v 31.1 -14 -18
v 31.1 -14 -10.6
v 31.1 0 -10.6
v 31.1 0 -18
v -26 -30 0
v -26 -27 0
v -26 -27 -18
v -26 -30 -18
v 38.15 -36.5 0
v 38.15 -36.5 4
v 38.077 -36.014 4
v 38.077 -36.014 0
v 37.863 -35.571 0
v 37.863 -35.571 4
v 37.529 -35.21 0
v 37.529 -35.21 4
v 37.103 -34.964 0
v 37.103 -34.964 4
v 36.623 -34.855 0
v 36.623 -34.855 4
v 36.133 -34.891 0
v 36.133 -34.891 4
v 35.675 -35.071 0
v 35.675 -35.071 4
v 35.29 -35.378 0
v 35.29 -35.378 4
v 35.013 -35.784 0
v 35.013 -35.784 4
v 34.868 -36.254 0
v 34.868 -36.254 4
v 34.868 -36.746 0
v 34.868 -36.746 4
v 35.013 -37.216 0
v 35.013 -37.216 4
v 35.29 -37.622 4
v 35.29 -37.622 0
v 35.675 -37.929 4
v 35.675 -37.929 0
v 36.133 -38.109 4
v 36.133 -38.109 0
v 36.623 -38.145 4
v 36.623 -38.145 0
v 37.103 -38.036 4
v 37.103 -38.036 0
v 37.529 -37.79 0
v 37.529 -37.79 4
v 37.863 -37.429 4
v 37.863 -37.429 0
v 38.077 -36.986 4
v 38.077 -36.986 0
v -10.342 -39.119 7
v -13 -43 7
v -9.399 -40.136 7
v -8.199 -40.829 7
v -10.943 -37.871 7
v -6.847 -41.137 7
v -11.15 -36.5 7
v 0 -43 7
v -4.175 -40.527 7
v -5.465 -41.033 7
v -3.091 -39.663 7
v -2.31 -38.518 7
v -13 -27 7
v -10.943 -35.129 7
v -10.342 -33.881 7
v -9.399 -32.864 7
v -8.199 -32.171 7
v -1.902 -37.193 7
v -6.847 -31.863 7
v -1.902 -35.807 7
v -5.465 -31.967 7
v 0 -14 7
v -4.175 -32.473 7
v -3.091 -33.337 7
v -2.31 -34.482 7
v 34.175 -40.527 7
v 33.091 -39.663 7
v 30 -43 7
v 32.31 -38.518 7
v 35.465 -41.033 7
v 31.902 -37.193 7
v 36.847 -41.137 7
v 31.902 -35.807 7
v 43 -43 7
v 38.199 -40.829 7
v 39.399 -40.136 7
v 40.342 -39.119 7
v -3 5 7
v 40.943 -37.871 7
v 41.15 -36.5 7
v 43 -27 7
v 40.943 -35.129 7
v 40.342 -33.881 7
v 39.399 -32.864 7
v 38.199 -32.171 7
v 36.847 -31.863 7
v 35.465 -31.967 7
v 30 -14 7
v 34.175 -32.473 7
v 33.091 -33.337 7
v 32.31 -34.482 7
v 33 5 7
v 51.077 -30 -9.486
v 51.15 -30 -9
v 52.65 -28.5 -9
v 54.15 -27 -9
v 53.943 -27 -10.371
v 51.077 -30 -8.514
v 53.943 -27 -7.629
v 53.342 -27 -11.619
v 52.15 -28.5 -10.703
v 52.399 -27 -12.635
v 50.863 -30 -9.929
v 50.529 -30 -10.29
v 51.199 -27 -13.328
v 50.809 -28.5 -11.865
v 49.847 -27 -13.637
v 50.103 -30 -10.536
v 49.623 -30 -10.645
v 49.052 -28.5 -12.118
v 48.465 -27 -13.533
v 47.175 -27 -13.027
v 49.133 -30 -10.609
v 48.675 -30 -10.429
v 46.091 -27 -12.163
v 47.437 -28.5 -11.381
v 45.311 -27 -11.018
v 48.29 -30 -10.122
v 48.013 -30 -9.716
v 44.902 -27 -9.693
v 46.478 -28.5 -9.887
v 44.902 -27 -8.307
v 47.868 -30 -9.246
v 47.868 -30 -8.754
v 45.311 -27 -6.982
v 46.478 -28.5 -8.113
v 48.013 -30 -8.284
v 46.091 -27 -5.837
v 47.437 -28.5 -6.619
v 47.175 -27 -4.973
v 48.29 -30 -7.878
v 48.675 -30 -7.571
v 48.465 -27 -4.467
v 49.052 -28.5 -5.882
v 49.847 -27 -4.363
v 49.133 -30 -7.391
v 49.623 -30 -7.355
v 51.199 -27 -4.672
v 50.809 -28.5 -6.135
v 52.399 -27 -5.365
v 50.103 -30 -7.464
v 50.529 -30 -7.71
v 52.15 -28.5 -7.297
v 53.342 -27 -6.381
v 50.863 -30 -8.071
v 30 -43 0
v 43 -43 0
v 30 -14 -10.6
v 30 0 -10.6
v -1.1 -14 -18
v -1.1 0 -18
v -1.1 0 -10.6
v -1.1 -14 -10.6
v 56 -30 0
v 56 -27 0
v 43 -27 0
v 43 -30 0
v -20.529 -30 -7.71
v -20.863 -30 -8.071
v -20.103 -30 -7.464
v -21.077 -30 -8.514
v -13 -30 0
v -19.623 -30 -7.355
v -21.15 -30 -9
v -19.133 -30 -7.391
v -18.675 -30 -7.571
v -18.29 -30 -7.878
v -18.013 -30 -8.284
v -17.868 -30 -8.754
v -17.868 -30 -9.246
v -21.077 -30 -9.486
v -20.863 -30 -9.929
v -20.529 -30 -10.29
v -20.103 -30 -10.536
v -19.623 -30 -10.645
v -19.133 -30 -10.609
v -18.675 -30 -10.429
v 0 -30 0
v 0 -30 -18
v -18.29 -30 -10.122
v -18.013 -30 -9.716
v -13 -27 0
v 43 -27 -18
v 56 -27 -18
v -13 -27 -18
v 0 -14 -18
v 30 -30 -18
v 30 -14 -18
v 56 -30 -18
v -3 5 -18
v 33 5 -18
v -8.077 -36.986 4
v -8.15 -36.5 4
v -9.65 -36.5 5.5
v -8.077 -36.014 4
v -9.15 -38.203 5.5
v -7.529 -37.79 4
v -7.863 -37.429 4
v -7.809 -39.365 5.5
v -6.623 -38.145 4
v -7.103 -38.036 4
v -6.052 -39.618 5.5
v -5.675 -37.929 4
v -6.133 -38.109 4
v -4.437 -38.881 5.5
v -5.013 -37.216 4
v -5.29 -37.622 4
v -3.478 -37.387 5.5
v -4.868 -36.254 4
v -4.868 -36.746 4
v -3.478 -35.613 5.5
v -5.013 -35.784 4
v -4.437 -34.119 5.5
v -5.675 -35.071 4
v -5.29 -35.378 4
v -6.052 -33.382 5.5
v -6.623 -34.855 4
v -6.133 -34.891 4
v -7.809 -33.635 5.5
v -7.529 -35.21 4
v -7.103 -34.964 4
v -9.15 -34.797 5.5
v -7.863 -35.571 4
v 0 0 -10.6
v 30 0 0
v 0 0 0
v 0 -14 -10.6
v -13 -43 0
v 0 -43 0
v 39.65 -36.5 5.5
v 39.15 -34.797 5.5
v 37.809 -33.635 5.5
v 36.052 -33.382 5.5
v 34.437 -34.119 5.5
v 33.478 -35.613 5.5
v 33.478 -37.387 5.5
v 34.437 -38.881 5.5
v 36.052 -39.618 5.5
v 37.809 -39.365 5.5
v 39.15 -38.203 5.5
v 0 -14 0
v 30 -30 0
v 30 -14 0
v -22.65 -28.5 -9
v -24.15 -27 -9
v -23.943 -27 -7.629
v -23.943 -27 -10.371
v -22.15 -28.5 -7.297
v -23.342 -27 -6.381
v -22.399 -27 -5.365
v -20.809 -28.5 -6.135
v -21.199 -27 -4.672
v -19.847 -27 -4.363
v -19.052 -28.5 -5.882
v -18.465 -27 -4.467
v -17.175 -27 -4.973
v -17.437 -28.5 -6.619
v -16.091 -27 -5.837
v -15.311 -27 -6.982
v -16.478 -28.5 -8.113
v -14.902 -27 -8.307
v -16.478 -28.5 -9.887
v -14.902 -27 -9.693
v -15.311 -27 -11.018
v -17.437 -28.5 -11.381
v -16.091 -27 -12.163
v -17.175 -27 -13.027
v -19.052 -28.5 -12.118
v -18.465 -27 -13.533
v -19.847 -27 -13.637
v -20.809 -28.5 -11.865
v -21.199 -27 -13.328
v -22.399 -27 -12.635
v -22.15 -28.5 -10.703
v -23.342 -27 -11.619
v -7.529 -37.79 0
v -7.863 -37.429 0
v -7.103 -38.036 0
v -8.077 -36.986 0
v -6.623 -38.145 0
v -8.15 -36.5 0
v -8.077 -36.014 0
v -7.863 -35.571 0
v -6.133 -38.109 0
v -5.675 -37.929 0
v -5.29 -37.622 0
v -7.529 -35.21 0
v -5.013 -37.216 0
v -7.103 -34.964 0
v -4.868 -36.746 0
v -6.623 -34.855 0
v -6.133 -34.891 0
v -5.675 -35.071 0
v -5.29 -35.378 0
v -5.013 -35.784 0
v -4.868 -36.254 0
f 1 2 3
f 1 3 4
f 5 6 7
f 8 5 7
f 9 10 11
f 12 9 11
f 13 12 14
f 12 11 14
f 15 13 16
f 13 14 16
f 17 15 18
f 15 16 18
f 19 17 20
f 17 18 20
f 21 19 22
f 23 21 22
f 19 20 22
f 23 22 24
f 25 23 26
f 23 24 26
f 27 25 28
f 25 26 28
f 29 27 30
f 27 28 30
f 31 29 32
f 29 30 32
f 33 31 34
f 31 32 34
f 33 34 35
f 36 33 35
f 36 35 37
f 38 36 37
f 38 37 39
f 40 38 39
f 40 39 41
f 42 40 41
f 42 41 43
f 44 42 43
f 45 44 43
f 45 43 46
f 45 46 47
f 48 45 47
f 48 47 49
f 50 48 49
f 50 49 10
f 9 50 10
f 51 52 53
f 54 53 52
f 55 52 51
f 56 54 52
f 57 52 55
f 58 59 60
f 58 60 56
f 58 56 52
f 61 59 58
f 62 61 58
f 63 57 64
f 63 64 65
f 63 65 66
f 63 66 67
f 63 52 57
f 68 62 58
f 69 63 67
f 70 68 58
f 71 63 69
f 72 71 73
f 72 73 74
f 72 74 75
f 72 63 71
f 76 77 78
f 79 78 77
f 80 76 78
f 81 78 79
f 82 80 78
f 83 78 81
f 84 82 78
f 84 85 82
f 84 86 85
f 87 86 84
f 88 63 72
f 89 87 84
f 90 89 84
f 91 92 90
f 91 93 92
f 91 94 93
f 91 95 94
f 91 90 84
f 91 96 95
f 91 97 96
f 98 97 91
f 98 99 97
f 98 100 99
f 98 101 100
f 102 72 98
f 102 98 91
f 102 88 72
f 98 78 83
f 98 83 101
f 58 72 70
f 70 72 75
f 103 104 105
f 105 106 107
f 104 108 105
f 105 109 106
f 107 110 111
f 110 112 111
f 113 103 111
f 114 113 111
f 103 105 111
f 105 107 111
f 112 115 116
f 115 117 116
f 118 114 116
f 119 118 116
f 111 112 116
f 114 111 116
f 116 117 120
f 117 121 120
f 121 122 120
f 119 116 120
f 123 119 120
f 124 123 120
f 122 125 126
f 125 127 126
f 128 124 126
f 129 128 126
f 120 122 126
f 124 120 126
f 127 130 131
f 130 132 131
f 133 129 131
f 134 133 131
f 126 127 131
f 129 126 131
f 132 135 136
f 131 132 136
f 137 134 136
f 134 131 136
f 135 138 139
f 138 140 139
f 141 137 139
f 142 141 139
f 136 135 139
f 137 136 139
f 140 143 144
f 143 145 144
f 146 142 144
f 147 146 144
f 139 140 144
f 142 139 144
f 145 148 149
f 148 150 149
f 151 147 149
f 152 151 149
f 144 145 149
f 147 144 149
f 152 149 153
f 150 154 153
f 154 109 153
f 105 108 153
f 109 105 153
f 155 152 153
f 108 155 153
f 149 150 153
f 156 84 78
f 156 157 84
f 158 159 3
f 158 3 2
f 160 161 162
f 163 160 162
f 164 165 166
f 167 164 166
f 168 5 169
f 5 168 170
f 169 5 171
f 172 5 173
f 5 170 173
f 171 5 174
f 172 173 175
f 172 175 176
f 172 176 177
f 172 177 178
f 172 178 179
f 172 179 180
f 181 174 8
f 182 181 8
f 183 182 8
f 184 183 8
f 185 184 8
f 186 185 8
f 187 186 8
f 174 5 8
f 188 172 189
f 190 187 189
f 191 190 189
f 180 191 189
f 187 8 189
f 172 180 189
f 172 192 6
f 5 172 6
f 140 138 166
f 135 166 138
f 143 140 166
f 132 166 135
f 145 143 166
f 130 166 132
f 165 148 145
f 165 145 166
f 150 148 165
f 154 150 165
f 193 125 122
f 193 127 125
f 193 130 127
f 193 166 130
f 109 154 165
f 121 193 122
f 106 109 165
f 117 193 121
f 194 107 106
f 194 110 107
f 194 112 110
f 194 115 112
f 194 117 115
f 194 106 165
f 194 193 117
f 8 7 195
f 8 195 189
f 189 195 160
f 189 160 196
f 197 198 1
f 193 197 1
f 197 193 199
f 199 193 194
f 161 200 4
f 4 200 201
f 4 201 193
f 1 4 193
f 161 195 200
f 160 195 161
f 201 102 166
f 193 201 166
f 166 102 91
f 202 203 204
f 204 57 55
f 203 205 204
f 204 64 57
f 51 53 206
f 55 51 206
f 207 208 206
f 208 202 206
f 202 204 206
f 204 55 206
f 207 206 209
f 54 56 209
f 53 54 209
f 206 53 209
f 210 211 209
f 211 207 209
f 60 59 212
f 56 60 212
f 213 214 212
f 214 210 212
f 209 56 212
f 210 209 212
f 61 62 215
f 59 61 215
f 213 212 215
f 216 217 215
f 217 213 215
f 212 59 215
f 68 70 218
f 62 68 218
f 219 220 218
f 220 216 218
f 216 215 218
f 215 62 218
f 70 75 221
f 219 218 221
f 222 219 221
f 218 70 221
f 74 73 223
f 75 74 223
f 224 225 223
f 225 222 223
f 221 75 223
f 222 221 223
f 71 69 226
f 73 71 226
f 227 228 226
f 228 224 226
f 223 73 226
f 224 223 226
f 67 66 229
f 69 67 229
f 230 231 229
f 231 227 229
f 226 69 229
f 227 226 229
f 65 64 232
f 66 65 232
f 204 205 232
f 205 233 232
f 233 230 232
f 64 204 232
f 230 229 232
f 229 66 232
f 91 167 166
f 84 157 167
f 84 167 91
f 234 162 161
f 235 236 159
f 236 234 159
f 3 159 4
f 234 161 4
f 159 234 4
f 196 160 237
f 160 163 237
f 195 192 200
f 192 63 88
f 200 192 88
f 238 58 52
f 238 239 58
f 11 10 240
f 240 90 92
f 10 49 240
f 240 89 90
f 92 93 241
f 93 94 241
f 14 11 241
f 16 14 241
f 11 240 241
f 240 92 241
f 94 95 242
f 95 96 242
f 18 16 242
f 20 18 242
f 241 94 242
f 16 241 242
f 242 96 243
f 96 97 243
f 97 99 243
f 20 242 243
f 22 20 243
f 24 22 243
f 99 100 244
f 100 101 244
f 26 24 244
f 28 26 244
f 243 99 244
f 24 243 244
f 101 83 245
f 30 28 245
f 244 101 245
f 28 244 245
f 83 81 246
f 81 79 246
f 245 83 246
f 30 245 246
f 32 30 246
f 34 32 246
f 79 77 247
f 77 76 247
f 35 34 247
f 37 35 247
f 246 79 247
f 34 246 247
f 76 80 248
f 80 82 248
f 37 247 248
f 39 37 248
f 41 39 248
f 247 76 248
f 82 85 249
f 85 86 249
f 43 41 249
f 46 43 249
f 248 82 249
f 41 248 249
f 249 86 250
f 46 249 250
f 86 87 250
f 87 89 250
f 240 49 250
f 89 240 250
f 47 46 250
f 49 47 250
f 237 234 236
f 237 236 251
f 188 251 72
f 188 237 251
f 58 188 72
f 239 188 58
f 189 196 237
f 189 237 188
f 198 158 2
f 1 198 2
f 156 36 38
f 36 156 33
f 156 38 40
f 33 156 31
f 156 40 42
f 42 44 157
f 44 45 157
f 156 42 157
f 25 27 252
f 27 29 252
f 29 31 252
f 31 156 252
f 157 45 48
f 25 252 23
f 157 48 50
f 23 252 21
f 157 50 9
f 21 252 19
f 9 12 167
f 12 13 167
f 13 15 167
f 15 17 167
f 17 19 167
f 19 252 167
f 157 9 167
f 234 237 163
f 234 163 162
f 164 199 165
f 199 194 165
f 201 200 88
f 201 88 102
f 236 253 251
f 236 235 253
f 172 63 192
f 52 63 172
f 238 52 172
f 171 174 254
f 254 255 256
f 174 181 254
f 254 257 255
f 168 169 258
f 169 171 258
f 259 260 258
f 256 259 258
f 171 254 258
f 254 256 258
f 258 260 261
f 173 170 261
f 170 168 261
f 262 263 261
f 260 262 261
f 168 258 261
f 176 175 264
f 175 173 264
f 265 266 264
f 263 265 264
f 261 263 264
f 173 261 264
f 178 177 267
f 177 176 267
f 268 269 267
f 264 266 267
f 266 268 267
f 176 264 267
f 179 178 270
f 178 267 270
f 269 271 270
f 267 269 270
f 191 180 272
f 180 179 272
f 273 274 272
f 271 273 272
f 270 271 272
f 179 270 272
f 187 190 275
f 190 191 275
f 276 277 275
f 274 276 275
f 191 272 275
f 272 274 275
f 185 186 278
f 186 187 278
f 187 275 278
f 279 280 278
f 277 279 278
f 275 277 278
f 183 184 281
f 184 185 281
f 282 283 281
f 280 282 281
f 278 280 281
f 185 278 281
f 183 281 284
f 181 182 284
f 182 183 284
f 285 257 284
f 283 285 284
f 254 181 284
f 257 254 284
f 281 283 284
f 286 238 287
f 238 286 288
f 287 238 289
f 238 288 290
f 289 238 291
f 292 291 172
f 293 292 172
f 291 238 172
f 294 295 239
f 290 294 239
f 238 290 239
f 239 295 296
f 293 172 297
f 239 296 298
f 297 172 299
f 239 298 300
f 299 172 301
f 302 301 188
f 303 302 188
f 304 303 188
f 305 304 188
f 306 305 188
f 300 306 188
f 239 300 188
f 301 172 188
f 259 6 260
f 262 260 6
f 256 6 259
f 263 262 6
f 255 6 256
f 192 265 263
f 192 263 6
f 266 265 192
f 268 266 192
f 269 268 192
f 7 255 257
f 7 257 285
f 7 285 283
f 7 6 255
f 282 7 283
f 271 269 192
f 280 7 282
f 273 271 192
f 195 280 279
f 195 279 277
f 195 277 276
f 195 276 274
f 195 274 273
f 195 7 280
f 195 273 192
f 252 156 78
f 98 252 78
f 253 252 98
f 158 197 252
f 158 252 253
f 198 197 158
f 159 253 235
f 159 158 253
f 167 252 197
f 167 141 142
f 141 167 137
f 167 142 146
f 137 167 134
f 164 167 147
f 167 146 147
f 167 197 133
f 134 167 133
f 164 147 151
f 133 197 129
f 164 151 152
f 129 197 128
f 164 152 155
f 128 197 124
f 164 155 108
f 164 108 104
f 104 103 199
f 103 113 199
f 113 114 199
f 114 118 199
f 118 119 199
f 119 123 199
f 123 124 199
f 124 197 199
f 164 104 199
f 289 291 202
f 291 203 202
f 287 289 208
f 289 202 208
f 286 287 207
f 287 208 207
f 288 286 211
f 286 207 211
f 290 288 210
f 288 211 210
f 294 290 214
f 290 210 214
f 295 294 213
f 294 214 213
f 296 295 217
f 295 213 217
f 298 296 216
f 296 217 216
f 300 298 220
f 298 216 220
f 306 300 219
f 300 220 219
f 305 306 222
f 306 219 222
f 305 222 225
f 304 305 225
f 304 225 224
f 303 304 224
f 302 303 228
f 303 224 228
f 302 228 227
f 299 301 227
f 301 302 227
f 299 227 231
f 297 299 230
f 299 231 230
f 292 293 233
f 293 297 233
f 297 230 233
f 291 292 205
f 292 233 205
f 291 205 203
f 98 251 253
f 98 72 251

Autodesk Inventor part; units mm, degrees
ref_plane "YZ Plane" through (0, 0, 0) normal (1, 0, 0) x (0, 1, 0)
ref_plane "XZ Plane" through (0, 0, 0) normal (0, 1, 0) x (-1, 0, 0)
ref_plane "XY Plane" through (0, 0, 0) normal (0, 0, 1) x (1, 0, 0)
sketch "Sketch1" plane through (0, 0, 0) normal (0, 1, 0) x (-1, 0, 0)
  line L0 (0, 0) -> (-30, 0)
  line L1 (-30, 0) -> (-30, -10.6)
  line L2 (-30, -10.6) -> (0, -10.6)
  line L3 (0, -10.6) -> (0, 0)
  line L4 (0, -10.6) -> (1.1, -10.6)
  line L5 (1.1, -10.6) -> (1.1, -18)
  line L6 (1.1, -18) -> (0, -18)
  line L7 (0, -18) -> (0, -10.6)
  line L8 (-30, -10.6) -> (-31.1, -10.6)
  line L9 (-31.1, -10.6) -> (-31.1, -18)
  line L10 (-31.1, -18) -> (-30, -18)
  line L11 (-30, -18) -> (-30, -10.6)
  line L12 (0, -18) -> (-30, -18)
  dimension "d0" = 30
  dimension "d1" = 10.6
  dimension "d2" = 1.1
  dimension "d3" = 1.1
  dimension "d4" = 7.4
  dimension "d5" = 7.4
extrude "Extrusion1" add sketch "Sketch1" along normal blind 3
sketch "Sketch2" plane through (30, 0, 0) normal (1, 0, 0) x (0, 0, -1)
  point P0 (0, 0)
sketch "Sketch3" plane through (30, 0, 0) normal (1, 0, 0) x (0, 0, -1)
  line L0 (0, 0) -> (10.6, 0) projected
  line L1 (0, 0) -> (0, -30)
  line L2 (0, -30) -> (10.6, -30)
  line L3 (10.6, 0) -> (10.6, -30)
  line L4 (10.6, 0) -> (0, 0) projected
  line L5 (0, 0) -> (10.6, 0)
  dimension "d8" = 30
sketch "Sketch4" plane through (31.1, 0, -10.6) normal (1, 0, 0) x (0, 0, -1)
  line L0 (0, 0) -> (7.4, 0) projected
  line L1 (7.4, 0) -> (7.4, -14)
  line L2 (7.4, -14) -> (0, -14)
  line L3 (0, -14) -> (0, 0)
  line L4 (0, 0) -> (7.4, 0)
  point P0 (-10.6, 0)
  dimension "d9" = 14
extrude "Extrusion2" add sketch "Sketch3" along normal blind 3
extrude "Extrusion3" add sketch "Sketch4" along normal blind 3
sketch "Sketch5" plane through (31.1, -14, -18) normal (0, -1, 0) x (1, 0, 0)
  line L0 (1.9, 7.4) -> (1.9, 18) projected
  line L1 (1.9, 7.4) -> (1.9, 0)
  line L2 (0, 0) -> (3, 0) projected
  line L3 (-1.1, 18) -> (-1.1, 7.4) projected
  line L4 (-1.1, 7.4) -> (-1.1, 0)
  line L5 (0, 0) -> (-32.2, 0) projected
  line L6 (-1.1, 7.4) -> (1.9, 7.4) projected
  line L7 (1.9, 7.4) -> (-1.1, 7.4)
  point P0 (-31.1, 18)
extrude "Extrusion4" add sketch "Sketch5" along normal blind 16
sketch "Sketch6" plane through (30, 0, 0) normal (0, 1, 0) x (1, 0, 0)
  line L0 (1.1, 10.6) -> (1.1, 18) projected
  line L1 (1.1, 10.6) -> (1.1, 0)
  line L2 (0, 0) -> (3, 0) projected
  line L3 (1.1, 0) -> (0, 0)
  line L4 (0, 0) -> (0, 10.6)
  line L5 (0, 0) -> (0, 18) projected
  line L6 (0, 10.6) -> (1.1, 10.6) projected
  line L7 (1.1, 10.6) -> (0, 10.6)
  point P0 (-30, 0)
extrude "Extrusion5" add sketch "Sketch6" along normal blind 3
sketch "Sketch7" plane through (31.1, 3, 0) normal (1, 0, 0) x (0, 0, -1)
  point P0 (0, -3)
sketch "Sketch8" plane through (31.1, 0, 0) normal (0, 1, 0) x (1, 0, 0)
  line L0 (0, 0) -> (1.9, 0) projected
  line L1 (0, 0) -> (0, 18) projected
  line L2 (1.9, 0) -> (0, 0)
  line L3 (0, 0) -> (0, 18)
  line L4 (0, 18) -> (1.9, 18)
  line L5 (1.9, 18) -> (1.9, 0)
  point P0 (-31.1, 0)
extrude "Extrusion6" add sketch "Sketch8" along normal up to surface (3 mm away)
sketch "Sketch9" plane through (33, -14, -10.6) normal (0, 0, 1) x (1, 0, 0)
  line L0 (0, 0) -> (0, 14) projected
  line L1 (0, 0) -> (1.1, 0) projected
  line L2 (1.1, 14) -> (1.1, 0) projected
  line L3 (0, 14) -> (1.1, 14) projected
  line L4 (0, 0) -> (0, 14) projected
  line L5 (0, 14) -> (1.1, 14)
  line L6 (1.1, 14) -> (1.1, 0)
  line L7 (1.1, 0) -> (0, 0)
  line L8 (0, 0) -> (0, 14)
  point P0 (-33, 14)
extrude "Extrusion7" cut sketch "Sketch9" against normal blind 2000
sketch "Sketch10" plane through (33, 0, 0) normal (1, 0, 0) x (0, 0, -1)
  line L0 (0, -30) -> (0, 3) projected
  line L1 (0, -30) -> (18, -30)
  line L2 (18, -30) -> (18, -27)
  line L3 (18, -27) -> (0, -27)
  line L4 (0, -27) -> (0, -30)
  point P0 (0, 0)
  point P1 (0, 1.1)
  dimension "d25" = 18
  dimension "d26" = 3
extrude "Extrusion8" add sketch "Sketch10" along normal blind 14
sketch "Sketch12" plane through (0, 3, 0) normal (0, 1, 0) x (1, 0, 0)
  line L0 (0, 10.6) -> (0, 0) projected
  line L1 (15, 0) -> (15, 18)
  point P0 (30, 10.6)
  point P1 (31.1, 10.6)
  point P2 (30, 0)
ref_plane "Work Plane1" through (15, 0, -10.6) normal (-1, 0, 0) x (0, 0, 1)
mirror "Mirror1" about plane through (15, 0, -10.6) normal (-1, 0, 0) of "Extrusion2", "Extrusion3", "Extrusion4", "Extrusion5", "Extrusion6", "Extrusion7", "Extrusion8"
sketch "Sketch13" plane through (30, -30, 0) normal (0, 0, 1) x (1, 0, 0)
  line L0 (-33, 33) -> (3, 33) projected
  line L1 (-30, 30) -> (0, 30)
  line L2 (0, 30) -> (0, 33)
  line L3 (0, 33) -> (-30, 33)
  line L4 (-30, 33) -> (-30, 30)
  point P0 (-31.1, 33)
  point P1 (1.1, 33)
  dimension "d36" = 30
extrude "Extrusion10" add sketch "Sketch13" along normal blind 7
sketch "Sketch14" plane through (0, 0, 0) normal (0, -1, 0) x (1, 0, 0)
  line L0 (0, 0) -> (0, 7) projected
  line L1 (30, 0) -> (30, -10.6) projected
  line L2 (0, 7) -> (30, 7)
  line L3 (30, 7) -> (30, 0)
  line L4 (30, 0) -> (0, 0)
  line L5 (0, 0) -> (0, 7)
extrude "Extrusion11" add sketch "Sketch14" along normal blind 14
sketch "Sketch16" plane through (0, 3, 0) normal (0, 1, 0) x (1, 0, 0)
  line L0 (30, -7) -> (0, -7) projected
  line L1 (-3, 18) -> (33, 18) projected
  line L2 (30, -7) -> (0, -7)
  line L3 (0, -7) -> (0, 18)
  line L4 (0, 18) -> (30, 18)
  line L5 (30, 18) -> (30, -7)
  line L6 (33, 18) -> (31.1, 18) projected
  line L7 (31.1, 18) -> (30, 18)
  line L8 (30, 18) -> (30, 0)
  line L9 (30, 0) -> (31.1, 0)
  line L10 (0, 0) -> (0, 18) projected
  line L11 (0, 18) -> (-1.1, 18)
  line L12 (-1.1, 0) -> (0, 0)
  line L13 (0, 0) -> (0, 18)
  line L14 (31.1, 18) -> (33, 18)
  line L15 (33, 0) -> (31.1, 0)
  line L16 (33, 0) -> (30, 0) projected
  line L17 (31.1, 18) -> (-1.1, 18) projected
  line L18 (-3, 18) -> (-17, 18) projected
  line L19 (-1.1, 18) -> (-3, 18)
  line L20 (-3, 18) -> (-3, 0) projected
  line L21 (-3, 18) -> (-3, 0)
  line L22 (-3, 0) -> (-1.1, 0)
  line L23 (0, 0) -> (-3, 0) projected
  line L24 (33, 18) -> (33, 0) projected
  line L25 (33, 18) -> (33, 0)
extrude "Extrusion13" add sketch "Sketch16" along normal blind 2
sketch "Sketch17" plane through (30, -30, 0) normal (0, 0, 1) x (1, 0, 0)
  line L0 (0, 35) -> (3, 35) projected
  line L1 (3, 35) -> (0, 35)
  line L2 (0, 35) -> (0, 0)
  line L3 (0, 0) -> (3, 0)
  line L4 (3, 0) -> (3, 35)
  line L5 (0, 0) -> (17, 0) projected
  line L6 (0, 0) -> (13, 0)
  line L7 (13, 0) -> (13, -13.0001)
  line L8 (13, -13.0001) -> (0, -13.0001)
  line L9 (0, -13.0001) -> (0, 0)
  point P0 (-30, 30)
  dimension "d45" = 13
extrude "Extrusion14" add sketch "Sketch17" along normal blind 7 contours L0 L4 L3 L2
sketch "Sketch18" plane through (33, -30, 0) normal (0, 0, 1) x (1, 0, 0)
  line L0 (-3, 16) -> (-3, 0) projected
  line L1 (-3, 0) -> (10, 0)
  line L2 (10, 0) -> (10, -13)
  line L3 (10, -13) -> (-3, -13)
  line L4 (-3, -13) -> (-3, 0)
  point P0 (-33, 30)
  dimension "d48" = 13
  dimension "d49" = 13
extrude "Extrusion15" add sketch "Sketch18" along normal blind 7
sketch "Sketch19" plane through (33, -30, 0) normal (0, 1, 0) x (1, 0, 0)
  line L0 (10, 0) -> (10, -7) projected
  line L1 (10, -7) -> (0, -7) projected
  line L2 (10, 0) -> (0, 0)
  line L3 (0, 0) -> (0, -7)
  line L4 (0, -7) -> (10, -7)
  line L5 (10, -7) -> (10, 0)
  point P0 (-33, 0)
sketch "Sketch20" plane through (30, -30, 7) normal (0, 0, 1) x (1, 0, 0)
  line L0 (13, -13) -> (13, 0) projected
  line L1 (13, -6.5) -> (0, -6.5) construction
  line L2 (0, -13) -> (0, 0) projected
  line L3 (3, 0) -> (13, 0) projected
  line L4 (6.5, 0) -> (6.5, -6.5) construction
  circle A0 centre (6.5, -6.5) radius 1.65
  point P0 (-30, 30)
  dimension "d52" = 3.3
extrude "Extrusion16" cut sketch "Sketch20" against normal blind 7
chamfer "Chamfer3" distance 3 angle 45 1 edges at (34.85, -36.5, 7)
extrude "Extrusion17" add sketch "Sketch19" along normal blind 3
sketch "Sketch21" plane through (33, -27, -18) normal (0, 1, 0) x (1, 0, 0)
  line L0 (14, 0) -> (14, -18) projected
  line L1 (14, 0) -> (23, 0)
  line L2 (23, 0) -> (23, -18)
  line L3 (23, -18) -> (14, -18)
  line L4 (14, -18) -> (14, 0)
  point P0 (-33, -18)
  dimension "d60" = 9
extrude "Extrusion18" add sketch "Sketch21" against normal blind 3
sketch "Sketch22" plane through (33, -27, 7) normal (0, 1, 0) x (1, 0, 0)
  line L0 (10, 7) -> (23, 7) projected
  line L1 (16.5, 7) -> (16.5, 25) construction
  line L2 (0, 25) -> (23, 25) projected
  line L3 (23, 25) -> (23, 7) projected
  line L4 (23, 16) -> (16.5, 16) construction
  circle A0 centre (16.5, 16) radius 1.65
  point P0 (-33, 7)
  dimension "d63" = 3.3
extrude "Extrusion19" cut sketch "Sketch22" against normal blind 3
chamfer "Chamfer4" distance 3 angle 45 1 edges at (47.85, -27, -9)
sketch "Sketch24" plane through (30, -30, 7) normal (0, 0, 1) x (1, 0, 0)
  line L0 (1.1, 30) -> (1.1, 16) projected
  line L1 (-30, 35) -> (3, 35) projected
  line L2 (-30, 16) -> (-30, 35) projected
  line L3 (0, 16) -> (-30, 16) projected
  line L4 (0, 16) -> (0, -13) projected
  line L5 (0, -13) -> (13, -13) projected
  line L6 (13, -13) -> (13, 3) projected
  line L7 (3, 3) -> (13, 3) projected
  line L8 (3, 3) -> (3, 35) projected
  circle A0 centre (6.5, -6.5) radius 4.65 projected
  line L9 (3, 35) -> (3, 3) projected
  line L10 (3, 35) -> (3, 3)
  line L11 (3, 3) -> (13, 3)
  line L12 (3, 35) -> (13, 3)
  point P0 (-30, 30)
extrude "Extrusion20" add sketch "Sketch24" against normal blind 25 contours L12 L7 L8
ref_plane "Work Plane2" through (15, 0, 0) normal (1, 0, 0) x (0, 0, -1)
mirror "Mirror2" about plane through (15, 0, 0) normal (1, 0, 0) of "Extrusion1", "Extrusion2", "Extrusion3", "Extrusion4", "Extrusion5", "Extrusion6", "Extrusion7", "Extrusion8", "Extrusion10", "Extrusion11", "Extrusion13", "Extrusion14", "Extrusion15", "Extrusion16", "Chamfer3", "Extrusion17", "Extrusion18", "Extrusion19", "Chamfer4", "Extrusion20"
ref_plane "Work Plane3" through (15, 0, -10.6) normal (-1, 0, 0) x (0, 0, 1)
properties part number "buttonHolder"
